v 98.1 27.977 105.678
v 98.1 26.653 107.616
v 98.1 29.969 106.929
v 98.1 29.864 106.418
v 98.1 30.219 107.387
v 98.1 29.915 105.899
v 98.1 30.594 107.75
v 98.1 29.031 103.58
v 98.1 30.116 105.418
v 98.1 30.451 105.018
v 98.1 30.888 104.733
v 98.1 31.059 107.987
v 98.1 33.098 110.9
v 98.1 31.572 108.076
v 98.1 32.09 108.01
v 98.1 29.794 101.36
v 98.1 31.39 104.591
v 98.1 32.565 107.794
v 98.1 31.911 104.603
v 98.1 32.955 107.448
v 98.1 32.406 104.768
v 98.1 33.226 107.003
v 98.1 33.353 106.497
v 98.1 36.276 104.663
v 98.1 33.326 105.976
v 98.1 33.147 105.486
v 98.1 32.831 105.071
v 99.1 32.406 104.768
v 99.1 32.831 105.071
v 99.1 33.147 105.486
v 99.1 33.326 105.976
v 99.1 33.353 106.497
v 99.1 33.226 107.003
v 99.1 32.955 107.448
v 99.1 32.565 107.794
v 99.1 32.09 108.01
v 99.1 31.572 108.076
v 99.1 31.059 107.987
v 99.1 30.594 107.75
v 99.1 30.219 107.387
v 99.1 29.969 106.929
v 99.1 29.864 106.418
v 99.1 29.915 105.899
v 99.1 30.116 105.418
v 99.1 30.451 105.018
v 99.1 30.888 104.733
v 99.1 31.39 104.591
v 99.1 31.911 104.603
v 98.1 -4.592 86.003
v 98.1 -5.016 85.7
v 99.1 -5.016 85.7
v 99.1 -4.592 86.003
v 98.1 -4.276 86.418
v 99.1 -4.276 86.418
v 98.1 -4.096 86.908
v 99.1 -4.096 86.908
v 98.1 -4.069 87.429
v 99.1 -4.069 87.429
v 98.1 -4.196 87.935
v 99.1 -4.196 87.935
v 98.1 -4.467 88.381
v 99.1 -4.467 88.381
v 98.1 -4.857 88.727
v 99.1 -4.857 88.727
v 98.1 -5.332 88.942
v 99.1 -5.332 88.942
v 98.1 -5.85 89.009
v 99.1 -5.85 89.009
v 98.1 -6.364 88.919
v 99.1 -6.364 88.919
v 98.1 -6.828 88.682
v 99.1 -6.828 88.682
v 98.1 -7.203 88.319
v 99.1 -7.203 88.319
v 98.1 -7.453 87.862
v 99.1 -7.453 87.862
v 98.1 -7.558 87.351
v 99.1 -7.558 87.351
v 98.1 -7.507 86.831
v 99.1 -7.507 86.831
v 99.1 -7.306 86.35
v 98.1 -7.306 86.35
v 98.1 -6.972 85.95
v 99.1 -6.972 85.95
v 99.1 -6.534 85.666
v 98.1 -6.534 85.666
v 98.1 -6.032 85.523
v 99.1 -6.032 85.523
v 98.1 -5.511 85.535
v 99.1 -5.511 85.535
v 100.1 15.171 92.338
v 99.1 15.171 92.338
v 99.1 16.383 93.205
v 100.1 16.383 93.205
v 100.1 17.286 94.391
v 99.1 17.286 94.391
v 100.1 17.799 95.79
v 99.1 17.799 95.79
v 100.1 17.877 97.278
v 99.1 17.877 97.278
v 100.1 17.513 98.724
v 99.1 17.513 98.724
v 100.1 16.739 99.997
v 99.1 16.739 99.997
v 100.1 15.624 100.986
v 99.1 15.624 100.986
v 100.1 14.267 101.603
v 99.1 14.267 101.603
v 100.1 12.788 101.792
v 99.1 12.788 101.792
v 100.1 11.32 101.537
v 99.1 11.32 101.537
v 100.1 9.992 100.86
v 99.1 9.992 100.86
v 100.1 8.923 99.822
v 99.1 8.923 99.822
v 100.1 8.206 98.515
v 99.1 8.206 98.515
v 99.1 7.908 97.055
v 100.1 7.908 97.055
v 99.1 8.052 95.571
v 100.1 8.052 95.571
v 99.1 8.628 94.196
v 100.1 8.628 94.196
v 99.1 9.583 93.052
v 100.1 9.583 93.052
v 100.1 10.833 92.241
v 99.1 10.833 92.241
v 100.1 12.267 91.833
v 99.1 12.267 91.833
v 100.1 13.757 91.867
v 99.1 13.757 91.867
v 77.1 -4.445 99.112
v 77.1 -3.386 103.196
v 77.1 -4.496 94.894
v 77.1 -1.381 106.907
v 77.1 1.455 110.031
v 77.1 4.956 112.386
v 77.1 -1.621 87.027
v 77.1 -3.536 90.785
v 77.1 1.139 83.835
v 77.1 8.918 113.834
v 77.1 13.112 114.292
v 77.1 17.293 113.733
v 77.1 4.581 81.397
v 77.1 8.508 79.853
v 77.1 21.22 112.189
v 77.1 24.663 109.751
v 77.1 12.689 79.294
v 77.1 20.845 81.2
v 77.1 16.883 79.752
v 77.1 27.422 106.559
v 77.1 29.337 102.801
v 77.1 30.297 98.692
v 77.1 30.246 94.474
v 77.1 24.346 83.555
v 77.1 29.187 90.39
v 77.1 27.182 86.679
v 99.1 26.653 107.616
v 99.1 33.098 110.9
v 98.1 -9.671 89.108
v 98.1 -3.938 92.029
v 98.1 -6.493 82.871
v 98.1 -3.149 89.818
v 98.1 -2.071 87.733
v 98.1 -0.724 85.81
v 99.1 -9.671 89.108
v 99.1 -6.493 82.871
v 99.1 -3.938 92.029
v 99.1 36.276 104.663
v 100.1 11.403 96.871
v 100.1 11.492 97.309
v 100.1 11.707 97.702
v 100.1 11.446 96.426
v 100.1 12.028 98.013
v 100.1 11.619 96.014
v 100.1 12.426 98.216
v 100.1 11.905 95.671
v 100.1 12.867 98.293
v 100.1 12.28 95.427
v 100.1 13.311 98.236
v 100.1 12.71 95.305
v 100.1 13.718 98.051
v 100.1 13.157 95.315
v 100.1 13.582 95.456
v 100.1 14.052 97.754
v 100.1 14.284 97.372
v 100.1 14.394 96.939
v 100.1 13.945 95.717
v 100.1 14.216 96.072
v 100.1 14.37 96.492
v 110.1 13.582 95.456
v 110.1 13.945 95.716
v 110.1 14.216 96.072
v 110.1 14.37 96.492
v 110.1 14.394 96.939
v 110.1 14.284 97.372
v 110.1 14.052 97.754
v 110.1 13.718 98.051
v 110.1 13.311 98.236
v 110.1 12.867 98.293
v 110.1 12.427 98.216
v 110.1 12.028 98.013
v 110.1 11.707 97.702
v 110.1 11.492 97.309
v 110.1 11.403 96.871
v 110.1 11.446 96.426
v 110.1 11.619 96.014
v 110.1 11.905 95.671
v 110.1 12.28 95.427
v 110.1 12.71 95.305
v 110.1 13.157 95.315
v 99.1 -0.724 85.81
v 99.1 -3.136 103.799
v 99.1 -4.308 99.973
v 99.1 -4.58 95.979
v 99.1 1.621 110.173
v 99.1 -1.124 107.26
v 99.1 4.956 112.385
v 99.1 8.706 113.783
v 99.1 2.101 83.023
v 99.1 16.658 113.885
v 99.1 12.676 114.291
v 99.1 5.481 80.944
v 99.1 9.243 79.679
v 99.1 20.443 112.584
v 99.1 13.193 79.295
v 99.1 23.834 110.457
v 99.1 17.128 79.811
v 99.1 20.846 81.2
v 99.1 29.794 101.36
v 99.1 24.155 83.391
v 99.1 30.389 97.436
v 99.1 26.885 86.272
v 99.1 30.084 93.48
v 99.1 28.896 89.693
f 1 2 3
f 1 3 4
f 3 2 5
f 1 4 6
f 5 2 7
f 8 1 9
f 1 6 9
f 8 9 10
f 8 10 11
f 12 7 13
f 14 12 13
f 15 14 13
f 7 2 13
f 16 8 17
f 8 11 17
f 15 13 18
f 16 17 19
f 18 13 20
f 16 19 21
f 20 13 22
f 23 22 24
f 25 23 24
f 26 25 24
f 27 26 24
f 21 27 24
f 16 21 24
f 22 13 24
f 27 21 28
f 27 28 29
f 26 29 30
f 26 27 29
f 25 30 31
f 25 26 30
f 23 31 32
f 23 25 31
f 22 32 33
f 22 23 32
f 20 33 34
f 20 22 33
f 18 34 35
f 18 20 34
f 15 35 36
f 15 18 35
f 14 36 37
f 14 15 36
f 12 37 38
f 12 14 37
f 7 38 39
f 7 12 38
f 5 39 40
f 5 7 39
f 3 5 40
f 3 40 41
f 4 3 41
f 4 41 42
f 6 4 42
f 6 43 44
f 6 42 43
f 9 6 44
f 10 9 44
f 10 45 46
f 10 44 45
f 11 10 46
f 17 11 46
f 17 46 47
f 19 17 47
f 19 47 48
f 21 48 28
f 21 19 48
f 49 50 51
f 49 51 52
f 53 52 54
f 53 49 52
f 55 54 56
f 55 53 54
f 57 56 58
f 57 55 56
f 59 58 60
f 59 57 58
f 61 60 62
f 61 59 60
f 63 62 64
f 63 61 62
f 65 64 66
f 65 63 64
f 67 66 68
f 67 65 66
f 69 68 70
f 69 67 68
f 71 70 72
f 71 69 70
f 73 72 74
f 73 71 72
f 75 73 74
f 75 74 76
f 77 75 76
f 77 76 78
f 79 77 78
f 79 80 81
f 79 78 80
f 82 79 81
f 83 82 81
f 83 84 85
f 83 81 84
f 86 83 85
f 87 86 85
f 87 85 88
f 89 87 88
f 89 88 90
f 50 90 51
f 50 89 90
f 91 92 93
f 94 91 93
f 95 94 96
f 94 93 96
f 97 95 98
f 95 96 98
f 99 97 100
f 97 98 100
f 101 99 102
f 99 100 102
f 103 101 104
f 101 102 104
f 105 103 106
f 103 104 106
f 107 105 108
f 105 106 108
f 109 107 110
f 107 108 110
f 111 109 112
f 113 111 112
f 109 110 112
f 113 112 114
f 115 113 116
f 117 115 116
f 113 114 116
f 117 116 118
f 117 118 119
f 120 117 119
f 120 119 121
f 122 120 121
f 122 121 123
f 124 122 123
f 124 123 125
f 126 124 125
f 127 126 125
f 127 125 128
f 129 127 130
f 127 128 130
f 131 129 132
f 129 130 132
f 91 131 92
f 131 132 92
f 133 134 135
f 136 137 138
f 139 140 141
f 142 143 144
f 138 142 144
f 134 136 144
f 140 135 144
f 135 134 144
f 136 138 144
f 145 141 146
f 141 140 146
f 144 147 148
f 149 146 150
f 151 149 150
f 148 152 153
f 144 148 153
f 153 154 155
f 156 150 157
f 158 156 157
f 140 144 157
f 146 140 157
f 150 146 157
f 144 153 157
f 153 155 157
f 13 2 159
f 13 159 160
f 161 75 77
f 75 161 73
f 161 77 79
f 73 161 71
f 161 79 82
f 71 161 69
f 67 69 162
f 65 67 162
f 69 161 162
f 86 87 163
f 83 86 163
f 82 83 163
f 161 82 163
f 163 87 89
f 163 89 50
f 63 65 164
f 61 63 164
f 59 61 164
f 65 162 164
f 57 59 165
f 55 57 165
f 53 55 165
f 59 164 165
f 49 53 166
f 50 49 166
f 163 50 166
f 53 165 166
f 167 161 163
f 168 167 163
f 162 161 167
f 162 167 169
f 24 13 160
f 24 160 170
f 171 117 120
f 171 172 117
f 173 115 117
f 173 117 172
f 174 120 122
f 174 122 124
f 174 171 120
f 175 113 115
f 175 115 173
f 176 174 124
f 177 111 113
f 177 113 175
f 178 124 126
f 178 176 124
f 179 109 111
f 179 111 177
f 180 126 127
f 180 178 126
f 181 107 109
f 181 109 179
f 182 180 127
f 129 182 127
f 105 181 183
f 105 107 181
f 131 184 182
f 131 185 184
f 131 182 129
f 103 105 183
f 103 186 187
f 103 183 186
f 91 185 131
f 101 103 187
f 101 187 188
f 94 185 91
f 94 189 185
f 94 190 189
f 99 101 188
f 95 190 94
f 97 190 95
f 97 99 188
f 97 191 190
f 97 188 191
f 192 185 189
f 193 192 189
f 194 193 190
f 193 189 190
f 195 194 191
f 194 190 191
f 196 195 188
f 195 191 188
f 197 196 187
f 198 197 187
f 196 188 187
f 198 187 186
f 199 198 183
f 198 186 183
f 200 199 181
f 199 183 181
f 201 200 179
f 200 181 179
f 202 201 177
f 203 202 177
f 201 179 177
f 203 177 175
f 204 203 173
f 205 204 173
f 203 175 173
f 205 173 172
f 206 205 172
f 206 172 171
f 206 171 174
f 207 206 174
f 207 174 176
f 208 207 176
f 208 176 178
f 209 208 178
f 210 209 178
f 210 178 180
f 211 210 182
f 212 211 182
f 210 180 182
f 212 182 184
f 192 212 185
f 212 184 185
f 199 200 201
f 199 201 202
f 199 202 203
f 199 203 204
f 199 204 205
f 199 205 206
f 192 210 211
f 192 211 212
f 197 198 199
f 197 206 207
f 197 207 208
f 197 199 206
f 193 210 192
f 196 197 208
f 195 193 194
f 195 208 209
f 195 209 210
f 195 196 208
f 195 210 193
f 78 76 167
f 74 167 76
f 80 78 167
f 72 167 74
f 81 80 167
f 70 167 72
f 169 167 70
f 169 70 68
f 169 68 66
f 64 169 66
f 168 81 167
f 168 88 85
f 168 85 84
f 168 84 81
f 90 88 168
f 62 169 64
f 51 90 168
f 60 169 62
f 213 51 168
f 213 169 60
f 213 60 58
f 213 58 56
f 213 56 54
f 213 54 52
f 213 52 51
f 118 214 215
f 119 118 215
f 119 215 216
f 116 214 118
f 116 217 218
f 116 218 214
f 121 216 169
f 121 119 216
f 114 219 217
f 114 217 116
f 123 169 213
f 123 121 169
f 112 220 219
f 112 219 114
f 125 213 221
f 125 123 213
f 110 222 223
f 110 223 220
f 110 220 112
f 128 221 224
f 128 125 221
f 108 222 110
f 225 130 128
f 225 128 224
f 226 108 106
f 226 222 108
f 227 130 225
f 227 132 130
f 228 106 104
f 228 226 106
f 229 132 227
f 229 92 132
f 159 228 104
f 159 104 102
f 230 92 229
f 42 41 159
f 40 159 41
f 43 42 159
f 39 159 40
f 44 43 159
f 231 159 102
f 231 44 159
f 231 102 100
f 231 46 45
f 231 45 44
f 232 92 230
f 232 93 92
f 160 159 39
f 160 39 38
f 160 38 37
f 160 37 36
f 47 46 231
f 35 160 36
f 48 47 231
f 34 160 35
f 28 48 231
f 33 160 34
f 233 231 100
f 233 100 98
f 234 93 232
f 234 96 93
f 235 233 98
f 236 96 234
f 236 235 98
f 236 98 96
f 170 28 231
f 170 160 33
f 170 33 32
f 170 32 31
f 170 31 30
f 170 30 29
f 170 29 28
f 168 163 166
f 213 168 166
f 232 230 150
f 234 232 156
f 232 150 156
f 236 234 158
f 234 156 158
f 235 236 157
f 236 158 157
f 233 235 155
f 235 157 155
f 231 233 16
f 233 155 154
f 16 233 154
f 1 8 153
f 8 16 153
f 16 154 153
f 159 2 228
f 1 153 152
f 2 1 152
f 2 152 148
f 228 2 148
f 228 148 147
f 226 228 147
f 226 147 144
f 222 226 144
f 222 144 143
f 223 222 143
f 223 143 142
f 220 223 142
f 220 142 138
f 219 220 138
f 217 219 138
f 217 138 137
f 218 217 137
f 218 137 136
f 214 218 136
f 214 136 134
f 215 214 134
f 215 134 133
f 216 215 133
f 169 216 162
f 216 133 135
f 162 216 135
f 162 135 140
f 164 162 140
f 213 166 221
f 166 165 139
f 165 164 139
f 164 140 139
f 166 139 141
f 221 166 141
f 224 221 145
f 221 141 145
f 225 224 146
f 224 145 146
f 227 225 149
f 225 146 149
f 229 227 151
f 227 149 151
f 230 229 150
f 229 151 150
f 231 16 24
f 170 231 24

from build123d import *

# Parameters (mm, degrees)
CYLINDER129_R             = 1.75
CYLINDER129_DEPTH         = 26
CYLINDER131_R             = 1.75
CYLINDER131_DEPTH         = 26
BOX066_W                  = 7
BOX066_H                  = 48
BOX066_DEPTH              = 1
CYLINDER132_R             = 1.5
CYLINDER132_DEPTH         = 10
CYLINDER130_R             = 5
CYLINDER130_DEPTH         = 1
CYLINDER128_R             = 17.5
CYLINDER128_DEPTH         = 22
FUSION092_ROLL_ANGLE      = 90.000432
FUSION092_PITCH_ANGLE     = 62.999717
FUSION092_PLACEMENT_ANGLE = 90.000641


with BuildPart() as cylinder129:
    # Cylinder129 → Cylinder129 (new body)
    with BuildSketch(Plane(origin=(0, 21, 0), x_dir=(1, 0, 0), z_dir=(0, 0, 1))):
        Circle(CYLINDER129_R)
    extrude(amount=CYLINDER129_DEPTH)


with BuildPart() as cylinder131:
    # Cylinder131 → Cylinder131 (new body)
    with BuildSketch(Plane(origin=(0, -21, 0), x_dir=(1, 0, 0), z_dir=(0, 0, 1))):
        Circle(CYLINDER131_R)
    extrude(amount=CYLINDER131_DEPTH)


with BuildPart() as cut183:
    # Box066 → Box066 (new body)
    with BuildSketch(Plane(origin=(-3.4, -23.6, 22), x_dir=(1, 0, 0), z_dir=(0, 0, 1))):
        with Locations((3.5, 24)):
            Rectangle(BOX066_W, BOX066_H)
    extrude(amount=BOX066_DEPTH)

    # Cut182: cut Cylinder131
    add(cylinder131.part, mode=Mode.SUBTRACT)

    # Cut183: cut Cylinder129
    add(cylinder129.part, mode=Mode.SUBTRACT)


with BuildPart() as cut183_1:
    # Cut183 placement: moved
    add(cut183.part.moved(Location((0, 0, -1))))


with BuildPart() as cylinder132:
    # Cylinder132 → Cylinder132 (new body)
    with BuildSketch(Plane.XY.offset(23)):
        Circle(CYLINDER132_R)
    extrude(amount=CYLINDER132_DEPTH)


with BuildPart() as cylinder130:
    # Cylinder130 → Cylinder130 (new body)
    with BuildSketch(Plane.XY.offset(22)):
        Circle(CYLINDER130_R)
    extrude(amount=CYLINDER130_DEPTH)


with BuildPart() as fusion092:
    # Cylinder128 → Cylinder128 (new body)
    with BuildSketch(Plane.XY):
        Circle(CYLINDER128_R)
    extrude(amount=CYLINDER128_DEPTH)

    # Fusion092: union Cut183, Cylinder132, Cylinder130
    add(cut183_1.part)
    add(cylinder132.part)
    add(cylinder130.part)


with BuildPart() as fusion092_1:
    # Fusion092 roll: moved
    add(fusion092.part.rotate(Axis((0, 0, 0), (1, 0, 0)), FUSION092_ROLL_ANGLE))


with BuildPart() as fusion092_2:
    # Fusion092 pitch: moved
    add(fusion092_1.part.rotate(Axis((0, 0, 0), (0, 1, 0)), FUSION092_PITCH_ANGLE))


with BuildPart() as fusion092_3:
    # Fusion092 placement: moved
    add(fusion092_2.part.moved(Location((77.100367, 12.900556, 96.792998))).rotate(Axis((77.100367, 12.900556, 96.792998), (0, 0, 1)), FUSION092_PLACEMENT_ANGLE))


solid = fusion092_3.part
